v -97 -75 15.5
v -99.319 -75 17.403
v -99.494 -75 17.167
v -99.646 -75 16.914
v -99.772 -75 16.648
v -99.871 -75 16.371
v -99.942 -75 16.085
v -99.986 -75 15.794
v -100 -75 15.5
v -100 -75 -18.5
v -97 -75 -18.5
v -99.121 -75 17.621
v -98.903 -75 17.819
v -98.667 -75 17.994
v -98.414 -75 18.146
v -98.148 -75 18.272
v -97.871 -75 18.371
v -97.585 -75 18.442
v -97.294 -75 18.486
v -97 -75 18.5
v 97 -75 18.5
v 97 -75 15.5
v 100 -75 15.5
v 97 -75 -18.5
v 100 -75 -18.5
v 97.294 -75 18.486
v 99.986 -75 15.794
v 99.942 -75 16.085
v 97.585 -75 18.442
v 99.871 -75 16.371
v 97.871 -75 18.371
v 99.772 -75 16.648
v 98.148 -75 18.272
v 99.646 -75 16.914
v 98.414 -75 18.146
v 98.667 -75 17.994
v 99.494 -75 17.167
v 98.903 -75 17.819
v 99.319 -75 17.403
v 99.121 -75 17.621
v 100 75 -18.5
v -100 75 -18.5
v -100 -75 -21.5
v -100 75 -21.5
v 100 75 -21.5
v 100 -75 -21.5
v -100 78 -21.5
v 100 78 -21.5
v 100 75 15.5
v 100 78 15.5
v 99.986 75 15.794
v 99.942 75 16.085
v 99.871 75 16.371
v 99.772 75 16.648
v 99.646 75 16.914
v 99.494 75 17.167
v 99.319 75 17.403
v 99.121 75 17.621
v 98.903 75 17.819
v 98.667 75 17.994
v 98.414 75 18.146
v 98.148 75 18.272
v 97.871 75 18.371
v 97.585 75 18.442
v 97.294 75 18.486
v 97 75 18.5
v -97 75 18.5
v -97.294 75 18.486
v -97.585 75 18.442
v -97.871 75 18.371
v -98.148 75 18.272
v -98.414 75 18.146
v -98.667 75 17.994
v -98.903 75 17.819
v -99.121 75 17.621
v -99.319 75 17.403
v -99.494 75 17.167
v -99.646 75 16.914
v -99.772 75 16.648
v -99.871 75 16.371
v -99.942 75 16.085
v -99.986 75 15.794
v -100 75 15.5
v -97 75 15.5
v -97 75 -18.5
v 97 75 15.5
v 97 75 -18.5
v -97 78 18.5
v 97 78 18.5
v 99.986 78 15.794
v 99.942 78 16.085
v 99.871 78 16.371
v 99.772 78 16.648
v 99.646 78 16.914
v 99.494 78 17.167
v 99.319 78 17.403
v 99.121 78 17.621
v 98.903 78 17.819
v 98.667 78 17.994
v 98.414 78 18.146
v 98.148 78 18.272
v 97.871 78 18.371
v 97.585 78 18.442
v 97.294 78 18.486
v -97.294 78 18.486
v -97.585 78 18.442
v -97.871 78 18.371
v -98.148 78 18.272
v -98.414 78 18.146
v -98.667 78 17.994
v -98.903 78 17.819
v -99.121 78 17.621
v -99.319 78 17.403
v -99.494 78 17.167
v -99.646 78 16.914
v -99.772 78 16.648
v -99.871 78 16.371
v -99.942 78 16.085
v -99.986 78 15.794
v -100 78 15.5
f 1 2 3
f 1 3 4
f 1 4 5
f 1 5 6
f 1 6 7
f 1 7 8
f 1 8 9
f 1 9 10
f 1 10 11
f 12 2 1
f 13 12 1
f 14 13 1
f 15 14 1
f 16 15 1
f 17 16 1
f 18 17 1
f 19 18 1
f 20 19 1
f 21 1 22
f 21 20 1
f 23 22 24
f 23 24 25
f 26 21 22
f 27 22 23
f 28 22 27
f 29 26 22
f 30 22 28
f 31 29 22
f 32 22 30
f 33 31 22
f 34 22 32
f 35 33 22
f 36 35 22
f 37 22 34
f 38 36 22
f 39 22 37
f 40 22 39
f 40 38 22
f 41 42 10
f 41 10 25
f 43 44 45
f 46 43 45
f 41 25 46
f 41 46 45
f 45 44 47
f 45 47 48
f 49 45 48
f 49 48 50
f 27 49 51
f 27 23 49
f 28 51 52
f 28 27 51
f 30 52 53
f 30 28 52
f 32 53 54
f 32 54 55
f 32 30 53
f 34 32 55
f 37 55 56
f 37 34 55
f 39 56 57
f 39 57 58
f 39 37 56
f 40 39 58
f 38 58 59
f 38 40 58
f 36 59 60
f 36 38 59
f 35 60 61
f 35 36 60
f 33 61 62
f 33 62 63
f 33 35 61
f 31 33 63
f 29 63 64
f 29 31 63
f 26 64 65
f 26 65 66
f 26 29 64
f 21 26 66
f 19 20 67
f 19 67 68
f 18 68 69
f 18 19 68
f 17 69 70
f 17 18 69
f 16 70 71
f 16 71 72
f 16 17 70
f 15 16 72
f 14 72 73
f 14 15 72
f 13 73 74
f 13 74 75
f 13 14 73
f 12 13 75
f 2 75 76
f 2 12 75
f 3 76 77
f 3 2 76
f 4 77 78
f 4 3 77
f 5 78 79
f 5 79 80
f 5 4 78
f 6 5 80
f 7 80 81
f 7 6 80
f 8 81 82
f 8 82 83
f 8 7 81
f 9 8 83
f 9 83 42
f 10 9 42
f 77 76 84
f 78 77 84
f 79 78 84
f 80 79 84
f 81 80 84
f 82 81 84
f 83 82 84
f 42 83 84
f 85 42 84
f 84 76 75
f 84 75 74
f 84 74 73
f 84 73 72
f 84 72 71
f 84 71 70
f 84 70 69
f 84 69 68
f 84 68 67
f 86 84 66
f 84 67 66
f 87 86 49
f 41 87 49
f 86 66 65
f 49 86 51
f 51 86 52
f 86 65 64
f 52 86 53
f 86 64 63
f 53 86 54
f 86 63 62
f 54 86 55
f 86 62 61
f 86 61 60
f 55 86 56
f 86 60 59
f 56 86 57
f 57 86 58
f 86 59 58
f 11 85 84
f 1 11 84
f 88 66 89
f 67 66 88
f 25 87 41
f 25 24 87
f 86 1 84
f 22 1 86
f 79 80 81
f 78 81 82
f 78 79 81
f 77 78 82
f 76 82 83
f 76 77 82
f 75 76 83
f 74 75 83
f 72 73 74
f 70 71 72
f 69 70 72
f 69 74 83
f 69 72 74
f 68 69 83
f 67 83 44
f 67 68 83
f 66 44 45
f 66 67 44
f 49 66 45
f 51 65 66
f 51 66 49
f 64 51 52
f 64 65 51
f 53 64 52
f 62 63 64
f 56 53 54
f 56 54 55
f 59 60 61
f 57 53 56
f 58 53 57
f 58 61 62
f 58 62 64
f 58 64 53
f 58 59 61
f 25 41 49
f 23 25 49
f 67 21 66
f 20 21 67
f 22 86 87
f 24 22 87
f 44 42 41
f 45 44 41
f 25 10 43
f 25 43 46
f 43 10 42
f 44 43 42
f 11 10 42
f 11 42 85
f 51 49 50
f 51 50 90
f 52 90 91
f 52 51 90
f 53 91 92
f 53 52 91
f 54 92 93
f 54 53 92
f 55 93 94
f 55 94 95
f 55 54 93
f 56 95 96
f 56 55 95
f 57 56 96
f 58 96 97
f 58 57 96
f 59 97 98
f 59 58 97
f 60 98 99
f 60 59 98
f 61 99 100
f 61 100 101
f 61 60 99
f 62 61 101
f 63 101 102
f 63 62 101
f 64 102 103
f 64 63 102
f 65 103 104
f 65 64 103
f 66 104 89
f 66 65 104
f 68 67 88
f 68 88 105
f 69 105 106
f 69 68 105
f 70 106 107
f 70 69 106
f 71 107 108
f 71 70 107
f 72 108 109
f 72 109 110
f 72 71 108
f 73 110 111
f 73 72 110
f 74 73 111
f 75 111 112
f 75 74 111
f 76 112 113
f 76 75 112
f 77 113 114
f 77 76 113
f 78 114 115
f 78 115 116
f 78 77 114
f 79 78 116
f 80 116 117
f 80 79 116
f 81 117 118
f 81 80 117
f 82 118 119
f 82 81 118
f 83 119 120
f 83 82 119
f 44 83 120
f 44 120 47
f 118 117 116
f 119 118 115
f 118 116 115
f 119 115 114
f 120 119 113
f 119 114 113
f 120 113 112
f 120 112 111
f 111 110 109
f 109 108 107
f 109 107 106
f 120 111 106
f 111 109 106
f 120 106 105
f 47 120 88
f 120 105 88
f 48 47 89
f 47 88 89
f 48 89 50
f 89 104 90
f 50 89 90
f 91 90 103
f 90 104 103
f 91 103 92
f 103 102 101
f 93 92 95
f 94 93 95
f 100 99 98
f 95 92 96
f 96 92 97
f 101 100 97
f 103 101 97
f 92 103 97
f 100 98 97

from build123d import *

# Parameters (mm, degrees)
F1_DEPTH      = 75
F1_DEPTH_BACK = 75
F3_W          = 200
F3_H          = 150
F4_DEPTH      = 3
F7_DEPTH      = 3


with BuildPart() as f1:
    # F0 (on Front) → F1 (new body, two sides)
    with BuildSketch(Plane.XZ) as f1_sk:
        with BuildLine():
            ThreePointArc((100, 15.5), (99.12132, 17.62132), (97, 18.5))
            Line((97, 18.5), (-97, 18.5))
            ThreePointArc((-97, 18.5), (-99.12132, 17.62132), (-100, 15.5))
            Line((-100, 15.5), (-100, -18.5))
            Line((-100, -18.5), (-97, -18.5))
            Line((-97, -18.5), (-97, 15.5))
            Line((-97, 15.5), (97, 15.5))
            Line((97, 15.5), (97, -18.5))
            Line((97, -18.5), (100, -18.5))
            Line((100, -18.5), (100, 15.5))
        make_face()
    extrude(amount=F1_DEPTH)
    extrude(f1_sk.sketch, amount=-F1_DEPTH_BACK)


with BuildPart() as f4:
    # F3 (on offset) → F4 (new body)
    with BuildSketch(Plane.XY.offset(-18.5)):
        Rectangle(F3_W, F3_H)
    extrude(amount=-F4_DEPTH)


with BuildPart() as f7:
    # F6 (on offset) → F7 (new body)
    with BuildSketch(Plane.XZ.offset(-75)):
        with BuildLine():
            ThreePointArc((100, 15.5), (99.12132, 17.62132), (97, 18.5))
            Line((97, 18.5), (-97, 18.5))
            ThreePointArc((-97, 18.5), (-99.12132, 17.62132), (-100, 15.5))
            Line((-100, 15.5), (-100, -21.5))
            Line((-100, -21.5), (100, -21.5))
            Line((100, -21.5), (100, 15.5))
        make_face()
    extrude(amount=-F7_DEPTH)


solid = Compound([f1.part, f4.part, f7.part])
